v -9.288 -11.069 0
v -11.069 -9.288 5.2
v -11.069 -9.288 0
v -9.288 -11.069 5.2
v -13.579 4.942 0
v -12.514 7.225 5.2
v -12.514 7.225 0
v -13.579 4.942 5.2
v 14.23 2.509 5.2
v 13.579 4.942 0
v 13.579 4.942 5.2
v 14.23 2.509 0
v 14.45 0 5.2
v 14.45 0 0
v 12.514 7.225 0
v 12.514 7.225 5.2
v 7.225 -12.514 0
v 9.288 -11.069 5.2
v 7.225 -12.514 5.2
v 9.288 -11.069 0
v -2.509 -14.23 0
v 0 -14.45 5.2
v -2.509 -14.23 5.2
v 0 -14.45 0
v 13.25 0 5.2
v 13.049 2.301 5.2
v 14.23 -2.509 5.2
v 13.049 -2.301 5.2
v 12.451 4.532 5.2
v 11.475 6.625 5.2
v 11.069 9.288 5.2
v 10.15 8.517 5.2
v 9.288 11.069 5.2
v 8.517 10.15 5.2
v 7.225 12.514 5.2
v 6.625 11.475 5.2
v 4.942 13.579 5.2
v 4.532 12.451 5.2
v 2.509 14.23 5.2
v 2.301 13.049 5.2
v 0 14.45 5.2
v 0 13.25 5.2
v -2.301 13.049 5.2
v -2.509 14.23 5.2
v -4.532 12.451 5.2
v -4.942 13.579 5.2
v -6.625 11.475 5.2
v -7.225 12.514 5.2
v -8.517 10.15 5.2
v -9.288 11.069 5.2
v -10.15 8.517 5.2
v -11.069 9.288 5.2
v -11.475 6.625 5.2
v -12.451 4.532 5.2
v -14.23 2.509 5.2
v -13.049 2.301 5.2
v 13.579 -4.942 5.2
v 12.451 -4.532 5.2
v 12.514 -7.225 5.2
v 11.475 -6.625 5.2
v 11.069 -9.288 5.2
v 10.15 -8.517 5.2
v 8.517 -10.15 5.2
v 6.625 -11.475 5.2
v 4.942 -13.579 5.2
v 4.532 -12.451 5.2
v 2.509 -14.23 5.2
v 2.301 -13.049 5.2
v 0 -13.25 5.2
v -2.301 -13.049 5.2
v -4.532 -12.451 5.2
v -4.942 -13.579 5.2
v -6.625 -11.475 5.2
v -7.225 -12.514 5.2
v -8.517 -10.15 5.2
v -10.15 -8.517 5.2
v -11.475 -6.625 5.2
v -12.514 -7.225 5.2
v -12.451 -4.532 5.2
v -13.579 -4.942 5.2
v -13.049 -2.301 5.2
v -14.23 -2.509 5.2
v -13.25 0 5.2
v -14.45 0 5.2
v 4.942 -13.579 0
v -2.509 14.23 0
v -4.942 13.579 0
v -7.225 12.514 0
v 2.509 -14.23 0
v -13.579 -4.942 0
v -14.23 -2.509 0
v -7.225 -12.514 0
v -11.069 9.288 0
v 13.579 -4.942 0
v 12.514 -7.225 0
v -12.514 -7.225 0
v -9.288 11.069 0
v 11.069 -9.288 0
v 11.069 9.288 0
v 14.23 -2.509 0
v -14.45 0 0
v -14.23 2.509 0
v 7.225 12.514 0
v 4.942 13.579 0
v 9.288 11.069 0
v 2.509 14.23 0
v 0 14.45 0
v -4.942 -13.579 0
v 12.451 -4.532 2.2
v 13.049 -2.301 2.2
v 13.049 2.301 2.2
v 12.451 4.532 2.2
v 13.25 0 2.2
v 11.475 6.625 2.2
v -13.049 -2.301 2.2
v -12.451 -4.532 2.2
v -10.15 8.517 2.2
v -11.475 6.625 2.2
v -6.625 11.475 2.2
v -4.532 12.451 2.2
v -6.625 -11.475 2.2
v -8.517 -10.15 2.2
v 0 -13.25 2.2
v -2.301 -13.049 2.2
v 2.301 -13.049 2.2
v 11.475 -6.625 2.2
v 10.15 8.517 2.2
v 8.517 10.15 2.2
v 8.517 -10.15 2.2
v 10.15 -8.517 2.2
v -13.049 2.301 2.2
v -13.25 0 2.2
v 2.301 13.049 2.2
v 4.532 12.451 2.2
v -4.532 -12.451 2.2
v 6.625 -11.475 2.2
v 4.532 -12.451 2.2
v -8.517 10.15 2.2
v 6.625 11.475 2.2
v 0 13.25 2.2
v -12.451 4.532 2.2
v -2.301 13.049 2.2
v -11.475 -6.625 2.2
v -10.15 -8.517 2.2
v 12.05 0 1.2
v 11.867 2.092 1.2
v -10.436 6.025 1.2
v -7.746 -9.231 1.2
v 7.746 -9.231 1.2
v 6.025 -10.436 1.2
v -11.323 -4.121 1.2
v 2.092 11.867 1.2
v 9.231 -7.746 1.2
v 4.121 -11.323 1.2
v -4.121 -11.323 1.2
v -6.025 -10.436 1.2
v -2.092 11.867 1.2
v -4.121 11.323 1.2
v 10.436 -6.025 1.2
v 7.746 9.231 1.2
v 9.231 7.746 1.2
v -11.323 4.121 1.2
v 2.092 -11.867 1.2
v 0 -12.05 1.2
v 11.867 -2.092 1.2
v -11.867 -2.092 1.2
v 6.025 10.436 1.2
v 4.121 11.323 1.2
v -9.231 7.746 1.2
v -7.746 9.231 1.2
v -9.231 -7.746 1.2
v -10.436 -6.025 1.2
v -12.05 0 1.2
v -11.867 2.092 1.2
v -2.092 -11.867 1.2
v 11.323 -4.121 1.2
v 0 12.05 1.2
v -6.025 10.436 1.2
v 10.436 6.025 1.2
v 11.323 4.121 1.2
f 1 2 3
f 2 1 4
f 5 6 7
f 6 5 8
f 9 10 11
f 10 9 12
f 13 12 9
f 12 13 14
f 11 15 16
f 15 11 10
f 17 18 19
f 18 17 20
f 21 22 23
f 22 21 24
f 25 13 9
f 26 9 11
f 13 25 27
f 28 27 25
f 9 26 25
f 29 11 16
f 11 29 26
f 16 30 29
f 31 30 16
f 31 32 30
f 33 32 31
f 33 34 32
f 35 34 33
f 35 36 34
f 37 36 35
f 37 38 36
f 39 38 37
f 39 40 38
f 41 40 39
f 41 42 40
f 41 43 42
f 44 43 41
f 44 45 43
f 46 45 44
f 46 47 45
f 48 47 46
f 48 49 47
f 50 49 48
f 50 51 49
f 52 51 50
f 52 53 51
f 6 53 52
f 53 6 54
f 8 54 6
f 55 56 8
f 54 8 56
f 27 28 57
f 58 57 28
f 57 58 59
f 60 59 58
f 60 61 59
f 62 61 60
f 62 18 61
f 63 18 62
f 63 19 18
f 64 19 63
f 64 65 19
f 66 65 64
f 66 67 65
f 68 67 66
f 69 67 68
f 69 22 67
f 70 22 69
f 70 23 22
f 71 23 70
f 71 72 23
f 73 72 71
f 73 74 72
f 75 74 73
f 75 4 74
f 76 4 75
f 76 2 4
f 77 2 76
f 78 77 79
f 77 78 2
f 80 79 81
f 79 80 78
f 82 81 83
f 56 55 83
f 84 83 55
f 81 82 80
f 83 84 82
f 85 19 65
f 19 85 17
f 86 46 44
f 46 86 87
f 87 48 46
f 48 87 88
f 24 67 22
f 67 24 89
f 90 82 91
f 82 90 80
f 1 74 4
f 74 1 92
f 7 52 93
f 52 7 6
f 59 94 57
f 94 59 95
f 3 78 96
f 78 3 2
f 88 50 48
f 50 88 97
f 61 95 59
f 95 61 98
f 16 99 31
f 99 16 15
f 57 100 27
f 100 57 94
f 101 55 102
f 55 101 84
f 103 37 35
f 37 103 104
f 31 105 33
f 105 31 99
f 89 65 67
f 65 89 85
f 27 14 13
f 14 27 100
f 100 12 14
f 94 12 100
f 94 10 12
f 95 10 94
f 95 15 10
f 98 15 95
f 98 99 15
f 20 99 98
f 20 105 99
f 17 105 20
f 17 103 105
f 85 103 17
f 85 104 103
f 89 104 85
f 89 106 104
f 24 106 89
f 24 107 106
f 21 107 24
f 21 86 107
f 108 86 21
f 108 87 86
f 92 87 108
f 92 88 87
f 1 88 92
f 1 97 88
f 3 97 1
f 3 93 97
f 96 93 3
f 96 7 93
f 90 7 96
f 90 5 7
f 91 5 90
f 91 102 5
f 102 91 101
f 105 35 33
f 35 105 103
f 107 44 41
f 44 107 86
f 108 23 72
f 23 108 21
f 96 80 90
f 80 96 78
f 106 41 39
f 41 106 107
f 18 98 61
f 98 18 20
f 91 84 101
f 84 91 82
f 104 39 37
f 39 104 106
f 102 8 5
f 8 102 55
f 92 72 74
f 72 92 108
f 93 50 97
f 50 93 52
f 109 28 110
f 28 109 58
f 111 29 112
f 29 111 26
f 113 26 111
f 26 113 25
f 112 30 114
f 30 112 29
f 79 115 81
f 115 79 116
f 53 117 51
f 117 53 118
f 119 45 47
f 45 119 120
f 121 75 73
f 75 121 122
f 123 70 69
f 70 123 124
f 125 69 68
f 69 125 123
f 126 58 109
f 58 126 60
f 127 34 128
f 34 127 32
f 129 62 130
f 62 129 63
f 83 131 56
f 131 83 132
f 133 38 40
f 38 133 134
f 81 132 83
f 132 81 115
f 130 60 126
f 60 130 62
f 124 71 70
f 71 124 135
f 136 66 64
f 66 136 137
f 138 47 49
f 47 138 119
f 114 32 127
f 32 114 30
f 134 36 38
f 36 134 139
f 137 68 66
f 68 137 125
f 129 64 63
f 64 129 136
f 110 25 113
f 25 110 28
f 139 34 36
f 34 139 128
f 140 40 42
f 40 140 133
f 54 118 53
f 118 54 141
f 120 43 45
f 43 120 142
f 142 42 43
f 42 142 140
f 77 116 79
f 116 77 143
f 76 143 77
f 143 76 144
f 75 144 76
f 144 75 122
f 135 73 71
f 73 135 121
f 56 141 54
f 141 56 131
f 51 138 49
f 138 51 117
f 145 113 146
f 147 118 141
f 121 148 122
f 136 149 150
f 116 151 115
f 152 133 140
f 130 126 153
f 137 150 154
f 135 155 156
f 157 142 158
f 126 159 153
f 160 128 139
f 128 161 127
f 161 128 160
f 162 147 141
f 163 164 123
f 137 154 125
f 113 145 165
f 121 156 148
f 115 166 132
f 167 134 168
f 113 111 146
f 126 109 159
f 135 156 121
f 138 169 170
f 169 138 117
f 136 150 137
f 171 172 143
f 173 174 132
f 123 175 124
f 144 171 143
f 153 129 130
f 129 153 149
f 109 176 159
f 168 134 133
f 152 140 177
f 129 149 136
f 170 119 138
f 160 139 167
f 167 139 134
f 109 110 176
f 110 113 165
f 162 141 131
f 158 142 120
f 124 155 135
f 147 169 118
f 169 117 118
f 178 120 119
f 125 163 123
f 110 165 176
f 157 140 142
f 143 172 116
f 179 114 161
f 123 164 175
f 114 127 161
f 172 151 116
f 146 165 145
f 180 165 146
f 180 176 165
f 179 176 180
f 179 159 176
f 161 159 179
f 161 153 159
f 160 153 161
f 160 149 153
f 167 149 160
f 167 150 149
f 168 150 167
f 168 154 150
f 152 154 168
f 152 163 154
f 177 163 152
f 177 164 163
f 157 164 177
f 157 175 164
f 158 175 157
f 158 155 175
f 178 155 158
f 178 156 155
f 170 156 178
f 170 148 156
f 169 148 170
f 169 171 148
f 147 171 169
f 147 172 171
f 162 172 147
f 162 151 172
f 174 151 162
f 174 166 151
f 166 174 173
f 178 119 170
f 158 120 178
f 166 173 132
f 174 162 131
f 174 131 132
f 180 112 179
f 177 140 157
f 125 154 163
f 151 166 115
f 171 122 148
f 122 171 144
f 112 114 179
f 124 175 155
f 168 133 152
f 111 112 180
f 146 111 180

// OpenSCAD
$fn=36;

d=26.5;//-26.4
d1=d;
h=4;//3-4
t=1.2;
h2=h+t;
hx=h/4;


difference()
{
cylinder(h=h2, d=d+t+t);


color("green")
translate([0,0,t+hx])
cylinder(h=h*5, d=d);

color("red")
translate([0,0,t])
cylinder(h=hx, d1=d1-t-t, d2=d1);
}

module spheretest()
{
color("red")
translate([0,0,h])
sphere(d=d);
}
